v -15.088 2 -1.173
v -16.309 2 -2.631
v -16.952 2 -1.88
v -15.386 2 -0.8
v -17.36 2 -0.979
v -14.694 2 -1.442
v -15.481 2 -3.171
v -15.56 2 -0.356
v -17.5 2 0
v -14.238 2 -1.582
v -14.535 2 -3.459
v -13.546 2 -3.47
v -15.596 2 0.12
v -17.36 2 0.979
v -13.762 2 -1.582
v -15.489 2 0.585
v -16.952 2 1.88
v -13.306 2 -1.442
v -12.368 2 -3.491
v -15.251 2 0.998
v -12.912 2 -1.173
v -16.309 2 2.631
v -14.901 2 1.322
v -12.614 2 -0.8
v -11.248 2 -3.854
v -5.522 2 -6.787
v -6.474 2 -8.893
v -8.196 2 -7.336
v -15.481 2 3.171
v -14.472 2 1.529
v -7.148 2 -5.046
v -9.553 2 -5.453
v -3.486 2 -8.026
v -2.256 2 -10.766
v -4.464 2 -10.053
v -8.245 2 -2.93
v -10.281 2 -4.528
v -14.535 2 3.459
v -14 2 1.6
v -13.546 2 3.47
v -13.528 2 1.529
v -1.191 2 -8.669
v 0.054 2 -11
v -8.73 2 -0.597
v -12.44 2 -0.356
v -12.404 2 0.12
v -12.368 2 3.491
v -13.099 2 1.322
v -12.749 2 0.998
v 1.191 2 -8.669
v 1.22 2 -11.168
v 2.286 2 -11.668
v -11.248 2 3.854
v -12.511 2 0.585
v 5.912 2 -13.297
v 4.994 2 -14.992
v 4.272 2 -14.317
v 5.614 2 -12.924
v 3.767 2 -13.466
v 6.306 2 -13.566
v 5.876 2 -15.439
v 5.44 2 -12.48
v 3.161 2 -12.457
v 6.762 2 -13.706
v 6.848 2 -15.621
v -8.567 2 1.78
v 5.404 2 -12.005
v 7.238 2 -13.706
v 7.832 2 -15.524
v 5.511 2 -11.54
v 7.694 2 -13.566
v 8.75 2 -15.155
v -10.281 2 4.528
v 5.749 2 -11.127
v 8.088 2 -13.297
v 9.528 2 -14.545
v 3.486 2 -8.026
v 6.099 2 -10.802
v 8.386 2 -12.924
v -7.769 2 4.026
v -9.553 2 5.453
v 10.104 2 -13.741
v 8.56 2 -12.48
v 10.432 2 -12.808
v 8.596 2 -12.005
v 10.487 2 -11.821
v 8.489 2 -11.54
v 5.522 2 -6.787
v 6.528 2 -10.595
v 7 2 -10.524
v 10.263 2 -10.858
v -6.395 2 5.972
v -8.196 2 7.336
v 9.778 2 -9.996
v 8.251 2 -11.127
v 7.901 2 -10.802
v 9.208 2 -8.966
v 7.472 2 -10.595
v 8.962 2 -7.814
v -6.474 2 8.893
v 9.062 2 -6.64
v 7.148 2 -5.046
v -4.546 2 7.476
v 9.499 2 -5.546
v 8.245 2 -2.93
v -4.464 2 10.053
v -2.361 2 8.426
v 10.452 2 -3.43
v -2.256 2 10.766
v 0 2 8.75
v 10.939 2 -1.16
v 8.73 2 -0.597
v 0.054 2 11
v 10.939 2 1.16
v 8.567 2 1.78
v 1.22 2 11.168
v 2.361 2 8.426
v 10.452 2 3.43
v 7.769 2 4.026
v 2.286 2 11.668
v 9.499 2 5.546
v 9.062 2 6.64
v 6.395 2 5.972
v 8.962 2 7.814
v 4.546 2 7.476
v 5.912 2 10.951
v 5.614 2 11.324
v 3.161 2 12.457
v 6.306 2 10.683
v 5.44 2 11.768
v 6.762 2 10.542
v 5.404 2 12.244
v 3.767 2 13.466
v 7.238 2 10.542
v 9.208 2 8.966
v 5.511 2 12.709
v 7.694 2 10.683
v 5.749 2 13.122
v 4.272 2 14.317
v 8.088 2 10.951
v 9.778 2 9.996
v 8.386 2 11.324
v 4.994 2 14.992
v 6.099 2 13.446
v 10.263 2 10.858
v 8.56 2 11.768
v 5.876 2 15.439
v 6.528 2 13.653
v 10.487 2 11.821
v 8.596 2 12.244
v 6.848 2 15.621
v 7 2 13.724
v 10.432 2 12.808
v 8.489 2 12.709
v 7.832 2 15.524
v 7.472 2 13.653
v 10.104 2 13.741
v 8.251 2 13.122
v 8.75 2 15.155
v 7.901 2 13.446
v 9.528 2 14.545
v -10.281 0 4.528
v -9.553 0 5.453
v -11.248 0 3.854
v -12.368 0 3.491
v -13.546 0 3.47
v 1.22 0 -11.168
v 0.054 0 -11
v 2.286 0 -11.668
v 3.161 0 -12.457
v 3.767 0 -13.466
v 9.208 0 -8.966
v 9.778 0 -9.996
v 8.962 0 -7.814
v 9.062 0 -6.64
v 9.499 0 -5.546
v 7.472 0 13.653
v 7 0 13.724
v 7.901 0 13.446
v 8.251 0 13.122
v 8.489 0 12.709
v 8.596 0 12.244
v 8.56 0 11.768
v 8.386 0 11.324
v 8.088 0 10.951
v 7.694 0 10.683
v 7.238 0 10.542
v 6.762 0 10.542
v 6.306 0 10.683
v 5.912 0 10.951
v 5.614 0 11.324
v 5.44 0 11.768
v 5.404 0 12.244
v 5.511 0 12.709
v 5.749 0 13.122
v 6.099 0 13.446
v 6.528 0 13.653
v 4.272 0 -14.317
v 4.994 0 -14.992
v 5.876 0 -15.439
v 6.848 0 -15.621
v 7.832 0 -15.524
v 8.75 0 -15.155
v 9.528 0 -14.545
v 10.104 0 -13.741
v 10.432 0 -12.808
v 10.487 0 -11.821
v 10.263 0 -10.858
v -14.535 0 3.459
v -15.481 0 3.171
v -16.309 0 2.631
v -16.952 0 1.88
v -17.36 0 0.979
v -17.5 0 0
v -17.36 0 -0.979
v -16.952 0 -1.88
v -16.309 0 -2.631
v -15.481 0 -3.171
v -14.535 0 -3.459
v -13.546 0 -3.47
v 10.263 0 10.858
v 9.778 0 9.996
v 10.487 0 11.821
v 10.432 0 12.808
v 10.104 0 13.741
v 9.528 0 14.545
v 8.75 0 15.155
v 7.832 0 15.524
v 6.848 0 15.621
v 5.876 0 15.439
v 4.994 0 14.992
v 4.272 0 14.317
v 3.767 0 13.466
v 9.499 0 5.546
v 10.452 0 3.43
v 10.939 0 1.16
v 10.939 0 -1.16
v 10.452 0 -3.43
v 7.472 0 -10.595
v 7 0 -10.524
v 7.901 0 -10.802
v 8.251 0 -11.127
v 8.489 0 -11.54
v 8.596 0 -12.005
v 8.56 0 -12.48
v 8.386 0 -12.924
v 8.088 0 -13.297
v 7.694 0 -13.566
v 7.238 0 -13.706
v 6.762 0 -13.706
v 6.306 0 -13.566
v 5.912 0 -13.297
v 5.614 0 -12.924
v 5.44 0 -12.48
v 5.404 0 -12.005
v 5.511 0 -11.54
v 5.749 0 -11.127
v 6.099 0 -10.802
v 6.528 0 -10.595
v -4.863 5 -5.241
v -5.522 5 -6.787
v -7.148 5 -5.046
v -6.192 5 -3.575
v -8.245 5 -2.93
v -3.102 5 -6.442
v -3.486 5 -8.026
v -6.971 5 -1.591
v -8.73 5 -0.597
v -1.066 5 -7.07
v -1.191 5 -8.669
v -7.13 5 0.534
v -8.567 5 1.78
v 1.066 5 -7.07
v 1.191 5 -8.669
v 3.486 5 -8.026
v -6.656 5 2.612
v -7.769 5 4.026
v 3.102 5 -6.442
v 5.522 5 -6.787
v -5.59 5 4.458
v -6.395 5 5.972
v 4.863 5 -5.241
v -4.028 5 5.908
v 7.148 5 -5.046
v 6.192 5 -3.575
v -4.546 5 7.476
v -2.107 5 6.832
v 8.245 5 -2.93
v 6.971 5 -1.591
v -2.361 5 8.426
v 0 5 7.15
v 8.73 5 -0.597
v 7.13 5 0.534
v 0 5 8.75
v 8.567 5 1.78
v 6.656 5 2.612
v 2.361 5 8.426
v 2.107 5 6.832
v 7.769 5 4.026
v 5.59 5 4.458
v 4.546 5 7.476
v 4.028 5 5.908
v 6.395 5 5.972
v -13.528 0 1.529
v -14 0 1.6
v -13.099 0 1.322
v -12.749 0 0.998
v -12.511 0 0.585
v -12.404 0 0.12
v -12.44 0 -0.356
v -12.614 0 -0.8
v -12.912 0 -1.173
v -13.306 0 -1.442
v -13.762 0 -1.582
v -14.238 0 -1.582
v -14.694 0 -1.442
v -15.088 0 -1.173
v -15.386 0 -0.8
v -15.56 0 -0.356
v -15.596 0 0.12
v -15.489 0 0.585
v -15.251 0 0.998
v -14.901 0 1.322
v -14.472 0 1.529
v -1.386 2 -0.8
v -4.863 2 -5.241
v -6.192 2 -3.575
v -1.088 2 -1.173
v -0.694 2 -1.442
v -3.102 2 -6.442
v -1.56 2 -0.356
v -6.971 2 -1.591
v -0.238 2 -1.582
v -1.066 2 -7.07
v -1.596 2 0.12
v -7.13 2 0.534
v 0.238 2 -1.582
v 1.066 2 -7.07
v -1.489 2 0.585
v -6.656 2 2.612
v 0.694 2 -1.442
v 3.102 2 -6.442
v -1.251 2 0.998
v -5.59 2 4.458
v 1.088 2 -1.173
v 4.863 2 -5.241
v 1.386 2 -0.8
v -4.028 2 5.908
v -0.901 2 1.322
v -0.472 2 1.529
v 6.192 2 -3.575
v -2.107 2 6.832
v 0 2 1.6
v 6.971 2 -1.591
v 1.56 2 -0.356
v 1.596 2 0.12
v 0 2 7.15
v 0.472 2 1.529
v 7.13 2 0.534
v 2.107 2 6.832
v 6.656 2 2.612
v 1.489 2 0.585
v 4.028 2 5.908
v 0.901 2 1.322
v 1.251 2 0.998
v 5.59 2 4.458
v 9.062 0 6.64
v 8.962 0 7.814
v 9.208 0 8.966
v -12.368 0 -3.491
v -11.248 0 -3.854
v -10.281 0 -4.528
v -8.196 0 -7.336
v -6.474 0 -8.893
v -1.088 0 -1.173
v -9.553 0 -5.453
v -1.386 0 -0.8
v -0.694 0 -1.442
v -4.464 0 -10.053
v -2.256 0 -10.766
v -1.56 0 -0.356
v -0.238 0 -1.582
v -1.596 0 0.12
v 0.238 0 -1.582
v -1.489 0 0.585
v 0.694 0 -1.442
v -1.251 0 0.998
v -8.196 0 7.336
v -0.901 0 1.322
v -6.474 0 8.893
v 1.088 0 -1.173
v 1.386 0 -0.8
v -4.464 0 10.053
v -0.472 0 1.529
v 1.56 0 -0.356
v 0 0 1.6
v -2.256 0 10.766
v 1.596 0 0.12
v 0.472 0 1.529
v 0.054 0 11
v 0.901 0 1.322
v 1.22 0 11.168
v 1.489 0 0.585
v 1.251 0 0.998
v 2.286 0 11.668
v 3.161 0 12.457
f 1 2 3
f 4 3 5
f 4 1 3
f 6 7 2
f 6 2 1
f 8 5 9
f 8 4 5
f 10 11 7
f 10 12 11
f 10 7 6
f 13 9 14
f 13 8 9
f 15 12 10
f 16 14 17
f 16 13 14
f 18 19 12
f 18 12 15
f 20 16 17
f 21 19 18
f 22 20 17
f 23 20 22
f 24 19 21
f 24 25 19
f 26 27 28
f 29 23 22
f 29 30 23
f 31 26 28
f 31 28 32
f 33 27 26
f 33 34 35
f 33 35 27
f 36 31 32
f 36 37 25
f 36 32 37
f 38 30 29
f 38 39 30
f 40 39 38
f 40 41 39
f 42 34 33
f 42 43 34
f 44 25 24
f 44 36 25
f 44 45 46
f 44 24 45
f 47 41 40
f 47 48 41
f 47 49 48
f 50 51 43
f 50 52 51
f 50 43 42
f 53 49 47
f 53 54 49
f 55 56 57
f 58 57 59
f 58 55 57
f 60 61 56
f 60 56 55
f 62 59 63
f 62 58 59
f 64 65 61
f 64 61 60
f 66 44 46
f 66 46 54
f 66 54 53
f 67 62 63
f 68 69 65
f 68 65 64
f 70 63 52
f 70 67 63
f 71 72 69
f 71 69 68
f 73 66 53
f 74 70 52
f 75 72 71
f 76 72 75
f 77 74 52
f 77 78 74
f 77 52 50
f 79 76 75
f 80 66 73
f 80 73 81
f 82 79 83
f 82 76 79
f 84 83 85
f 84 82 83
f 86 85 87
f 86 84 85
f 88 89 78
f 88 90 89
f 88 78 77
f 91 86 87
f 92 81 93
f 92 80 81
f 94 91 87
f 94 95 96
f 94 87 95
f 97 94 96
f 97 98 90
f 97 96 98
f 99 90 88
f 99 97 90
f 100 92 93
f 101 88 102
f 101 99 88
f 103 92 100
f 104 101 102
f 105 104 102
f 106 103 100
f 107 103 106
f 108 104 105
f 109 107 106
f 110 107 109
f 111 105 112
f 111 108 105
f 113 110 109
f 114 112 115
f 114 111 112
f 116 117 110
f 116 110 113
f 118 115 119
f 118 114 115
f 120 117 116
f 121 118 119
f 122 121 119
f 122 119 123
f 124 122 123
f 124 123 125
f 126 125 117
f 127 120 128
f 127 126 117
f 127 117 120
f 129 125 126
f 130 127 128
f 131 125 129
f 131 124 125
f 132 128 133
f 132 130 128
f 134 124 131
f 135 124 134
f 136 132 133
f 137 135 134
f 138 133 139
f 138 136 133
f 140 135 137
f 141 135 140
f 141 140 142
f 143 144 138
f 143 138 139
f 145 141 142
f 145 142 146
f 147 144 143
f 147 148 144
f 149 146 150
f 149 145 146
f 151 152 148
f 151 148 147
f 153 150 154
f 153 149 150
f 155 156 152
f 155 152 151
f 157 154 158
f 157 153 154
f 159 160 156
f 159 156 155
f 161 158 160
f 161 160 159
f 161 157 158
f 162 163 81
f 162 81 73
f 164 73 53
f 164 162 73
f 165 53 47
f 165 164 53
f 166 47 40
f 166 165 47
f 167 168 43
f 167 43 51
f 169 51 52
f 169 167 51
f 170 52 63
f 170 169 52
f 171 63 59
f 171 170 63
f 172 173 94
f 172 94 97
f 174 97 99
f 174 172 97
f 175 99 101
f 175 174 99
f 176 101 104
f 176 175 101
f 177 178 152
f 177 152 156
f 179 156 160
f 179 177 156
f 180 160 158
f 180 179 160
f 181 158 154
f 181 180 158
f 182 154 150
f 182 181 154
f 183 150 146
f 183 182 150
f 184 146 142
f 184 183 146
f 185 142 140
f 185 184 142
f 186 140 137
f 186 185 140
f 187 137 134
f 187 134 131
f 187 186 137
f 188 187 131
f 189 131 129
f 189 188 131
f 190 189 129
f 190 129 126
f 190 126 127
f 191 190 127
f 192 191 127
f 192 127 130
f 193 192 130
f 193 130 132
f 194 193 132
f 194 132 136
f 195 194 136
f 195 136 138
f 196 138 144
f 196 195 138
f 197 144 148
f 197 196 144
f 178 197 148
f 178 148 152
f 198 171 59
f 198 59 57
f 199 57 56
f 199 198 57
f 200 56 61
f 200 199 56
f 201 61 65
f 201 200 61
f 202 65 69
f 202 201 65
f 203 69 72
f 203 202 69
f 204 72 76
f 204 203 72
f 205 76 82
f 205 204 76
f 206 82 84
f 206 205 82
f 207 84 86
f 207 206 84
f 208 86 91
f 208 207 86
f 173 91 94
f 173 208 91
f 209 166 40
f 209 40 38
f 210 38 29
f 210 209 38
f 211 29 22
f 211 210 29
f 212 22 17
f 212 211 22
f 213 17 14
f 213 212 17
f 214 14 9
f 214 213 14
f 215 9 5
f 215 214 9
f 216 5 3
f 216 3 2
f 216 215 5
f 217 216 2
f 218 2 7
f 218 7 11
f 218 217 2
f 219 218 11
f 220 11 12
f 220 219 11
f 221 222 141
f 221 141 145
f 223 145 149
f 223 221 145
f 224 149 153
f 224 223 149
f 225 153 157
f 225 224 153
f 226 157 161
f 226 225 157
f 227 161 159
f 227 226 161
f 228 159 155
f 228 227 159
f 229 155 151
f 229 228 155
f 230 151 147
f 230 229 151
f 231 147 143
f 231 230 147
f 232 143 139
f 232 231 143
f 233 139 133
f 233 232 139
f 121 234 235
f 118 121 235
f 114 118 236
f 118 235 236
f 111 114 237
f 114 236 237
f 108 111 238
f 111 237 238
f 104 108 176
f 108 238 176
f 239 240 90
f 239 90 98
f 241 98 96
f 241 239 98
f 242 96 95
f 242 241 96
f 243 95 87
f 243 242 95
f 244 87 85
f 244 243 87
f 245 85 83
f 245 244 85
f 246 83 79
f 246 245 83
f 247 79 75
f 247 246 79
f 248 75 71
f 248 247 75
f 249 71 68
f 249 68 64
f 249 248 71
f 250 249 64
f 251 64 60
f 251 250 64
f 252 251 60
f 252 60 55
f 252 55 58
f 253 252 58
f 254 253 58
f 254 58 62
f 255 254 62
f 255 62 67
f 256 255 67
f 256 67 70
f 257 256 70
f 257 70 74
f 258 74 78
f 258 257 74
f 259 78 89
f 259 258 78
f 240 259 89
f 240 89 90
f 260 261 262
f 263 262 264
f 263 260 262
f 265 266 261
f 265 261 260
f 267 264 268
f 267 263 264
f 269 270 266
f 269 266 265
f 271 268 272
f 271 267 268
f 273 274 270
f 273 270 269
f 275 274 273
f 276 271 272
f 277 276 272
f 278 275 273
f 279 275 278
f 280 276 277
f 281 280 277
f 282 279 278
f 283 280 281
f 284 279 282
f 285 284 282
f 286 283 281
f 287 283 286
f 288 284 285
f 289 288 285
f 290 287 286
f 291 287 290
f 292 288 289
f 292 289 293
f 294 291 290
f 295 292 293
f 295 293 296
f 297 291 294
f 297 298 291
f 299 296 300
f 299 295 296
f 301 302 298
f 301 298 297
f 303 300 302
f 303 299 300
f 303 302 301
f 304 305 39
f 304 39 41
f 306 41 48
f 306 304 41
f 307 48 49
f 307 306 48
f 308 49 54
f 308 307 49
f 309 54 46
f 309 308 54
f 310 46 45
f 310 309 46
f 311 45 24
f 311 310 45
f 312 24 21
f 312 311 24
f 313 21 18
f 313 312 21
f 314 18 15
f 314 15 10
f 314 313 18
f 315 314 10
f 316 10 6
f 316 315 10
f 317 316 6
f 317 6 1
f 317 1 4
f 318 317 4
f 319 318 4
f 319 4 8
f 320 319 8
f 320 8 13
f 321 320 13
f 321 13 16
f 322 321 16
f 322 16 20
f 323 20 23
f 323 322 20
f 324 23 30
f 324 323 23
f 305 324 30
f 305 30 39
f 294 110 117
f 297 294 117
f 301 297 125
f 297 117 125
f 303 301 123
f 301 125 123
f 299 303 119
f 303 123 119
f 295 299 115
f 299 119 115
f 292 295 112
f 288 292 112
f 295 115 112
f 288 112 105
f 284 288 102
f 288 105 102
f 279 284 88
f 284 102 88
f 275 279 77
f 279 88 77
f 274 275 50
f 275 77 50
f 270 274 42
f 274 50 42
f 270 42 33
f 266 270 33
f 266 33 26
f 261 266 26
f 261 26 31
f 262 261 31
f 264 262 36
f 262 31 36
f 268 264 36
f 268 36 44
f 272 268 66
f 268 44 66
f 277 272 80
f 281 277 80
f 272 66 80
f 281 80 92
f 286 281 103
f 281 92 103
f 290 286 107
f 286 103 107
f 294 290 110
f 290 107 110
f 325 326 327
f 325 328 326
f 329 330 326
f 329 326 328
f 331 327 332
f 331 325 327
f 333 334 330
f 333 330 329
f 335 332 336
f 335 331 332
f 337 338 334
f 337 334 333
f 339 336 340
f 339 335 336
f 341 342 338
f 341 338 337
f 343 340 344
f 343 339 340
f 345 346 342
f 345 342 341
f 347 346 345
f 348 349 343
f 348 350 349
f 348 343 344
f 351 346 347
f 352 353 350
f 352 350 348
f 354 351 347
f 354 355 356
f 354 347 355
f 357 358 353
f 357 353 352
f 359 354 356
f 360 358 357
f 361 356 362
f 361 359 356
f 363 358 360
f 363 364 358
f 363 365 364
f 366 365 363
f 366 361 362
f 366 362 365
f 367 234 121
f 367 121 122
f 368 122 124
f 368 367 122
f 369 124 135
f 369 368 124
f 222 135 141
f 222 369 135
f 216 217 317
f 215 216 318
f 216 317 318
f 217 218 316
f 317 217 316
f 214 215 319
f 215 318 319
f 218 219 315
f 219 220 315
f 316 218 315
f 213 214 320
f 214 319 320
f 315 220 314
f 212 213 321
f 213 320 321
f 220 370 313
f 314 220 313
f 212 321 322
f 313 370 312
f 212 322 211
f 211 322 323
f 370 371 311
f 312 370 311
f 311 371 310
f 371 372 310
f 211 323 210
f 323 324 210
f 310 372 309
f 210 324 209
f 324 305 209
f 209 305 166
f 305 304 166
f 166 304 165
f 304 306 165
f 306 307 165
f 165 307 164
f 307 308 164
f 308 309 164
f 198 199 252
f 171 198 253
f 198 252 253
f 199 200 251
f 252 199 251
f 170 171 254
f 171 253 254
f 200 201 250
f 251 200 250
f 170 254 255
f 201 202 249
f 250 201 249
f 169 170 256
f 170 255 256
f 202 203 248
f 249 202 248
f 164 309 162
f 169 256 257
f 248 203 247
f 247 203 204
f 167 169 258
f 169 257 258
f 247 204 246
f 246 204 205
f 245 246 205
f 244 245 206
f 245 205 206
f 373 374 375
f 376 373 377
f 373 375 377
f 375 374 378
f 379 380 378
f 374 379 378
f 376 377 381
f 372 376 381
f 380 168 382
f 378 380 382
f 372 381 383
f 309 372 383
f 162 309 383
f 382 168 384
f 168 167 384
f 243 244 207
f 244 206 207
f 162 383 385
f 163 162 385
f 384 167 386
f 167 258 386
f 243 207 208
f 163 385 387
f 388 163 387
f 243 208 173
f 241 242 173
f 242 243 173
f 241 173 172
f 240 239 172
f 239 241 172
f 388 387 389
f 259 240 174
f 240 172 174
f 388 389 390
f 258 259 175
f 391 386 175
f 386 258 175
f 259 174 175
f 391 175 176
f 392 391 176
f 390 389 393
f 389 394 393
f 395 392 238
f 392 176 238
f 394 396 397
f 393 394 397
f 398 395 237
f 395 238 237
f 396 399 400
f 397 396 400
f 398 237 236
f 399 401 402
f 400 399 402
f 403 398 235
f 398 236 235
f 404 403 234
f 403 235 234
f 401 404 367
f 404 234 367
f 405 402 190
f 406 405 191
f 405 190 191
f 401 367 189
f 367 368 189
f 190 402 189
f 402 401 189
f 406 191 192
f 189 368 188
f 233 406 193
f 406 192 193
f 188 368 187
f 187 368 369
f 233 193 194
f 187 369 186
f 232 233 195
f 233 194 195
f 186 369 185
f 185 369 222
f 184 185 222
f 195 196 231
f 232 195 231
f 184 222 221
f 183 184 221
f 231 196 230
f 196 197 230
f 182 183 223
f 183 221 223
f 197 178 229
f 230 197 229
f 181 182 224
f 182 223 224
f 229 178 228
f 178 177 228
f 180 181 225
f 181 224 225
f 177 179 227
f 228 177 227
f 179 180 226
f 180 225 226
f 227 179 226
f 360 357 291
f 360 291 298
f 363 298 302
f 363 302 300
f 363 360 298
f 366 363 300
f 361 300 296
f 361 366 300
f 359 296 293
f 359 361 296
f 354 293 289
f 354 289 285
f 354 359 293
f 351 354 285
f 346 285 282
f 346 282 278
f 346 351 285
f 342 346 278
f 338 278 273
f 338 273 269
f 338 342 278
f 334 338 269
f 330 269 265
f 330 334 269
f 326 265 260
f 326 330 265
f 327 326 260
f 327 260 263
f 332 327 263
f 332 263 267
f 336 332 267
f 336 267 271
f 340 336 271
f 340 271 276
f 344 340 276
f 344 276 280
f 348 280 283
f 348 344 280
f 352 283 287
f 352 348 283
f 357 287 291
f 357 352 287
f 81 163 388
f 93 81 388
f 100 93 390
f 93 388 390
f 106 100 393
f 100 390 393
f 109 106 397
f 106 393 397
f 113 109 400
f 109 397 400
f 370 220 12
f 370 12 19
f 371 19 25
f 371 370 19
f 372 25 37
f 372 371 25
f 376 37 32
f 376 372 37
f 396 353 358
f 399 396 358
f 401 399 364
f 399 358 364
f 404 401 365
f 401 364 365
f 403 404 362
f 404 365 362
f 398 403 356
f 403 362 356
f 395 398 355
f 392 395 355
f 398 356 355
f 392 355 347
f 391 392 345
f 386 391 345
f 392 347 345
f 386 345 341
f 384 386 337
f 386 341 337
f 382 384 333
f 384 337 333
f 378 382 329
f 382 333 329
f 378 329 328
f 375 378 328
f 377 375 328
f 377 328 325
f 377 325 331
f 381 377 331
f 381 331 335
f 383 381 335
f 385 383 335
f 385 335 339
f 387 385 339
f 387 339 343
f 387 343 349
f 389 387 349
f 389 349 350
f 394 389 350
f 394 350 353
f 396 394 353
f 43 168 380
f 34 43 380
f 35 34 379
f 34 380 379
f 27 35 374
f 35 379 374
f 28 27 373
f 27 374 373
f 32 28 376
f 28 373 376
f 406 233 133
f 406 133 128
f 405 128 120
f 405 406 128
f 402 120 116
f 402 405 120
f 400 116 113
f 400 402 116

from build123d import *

# Parameters (mm, degrees)
SKETCH_1_R          = 11
EXTRUDE_1_DEPTH     = 2
EXTRUDE_START       = -2
SKETCH_2_R          = 1.6
EXTRUDE_2_DEPTH     = 2
CUT_EXTRUDE_1_REACH = 25.545
SKETCH_3_R          = 1.6
SKETCH_4_R          = 8.75
SKETCH_4_R_2        = 7.15
EXTRUDE_3_DEPTH     = 3


with BuildPart() as part:
    # 草图1 → 凸台-拉伸1 (new body)
    with BuildSketch(Plane(origin=(0, 0, 0), x_dir=(1, 0, 0), z_dir=(0, 1, 0))):
        with Locations(Location((0, 0, 0), (0, 0, 270))):
            Circle(SKETCH_1_R)
    extrude(amount=EXTRUDE_1_DEPTH)

    # 草图2 → 凸台-拉伸2 (add)
    # profile 1 of 3: a face of its own
    with BuildSketch(Plane(origin=(0, 2, 0), x_dir=(1, 0, 0), z_dir=(0, 1, 0)).offset(EXTRUDE_START)):
        with BuildLine():
            ThreePointArc((0.053619854, -10.999869313), (5.5, -9.526279442), (9.499356337, -5.546370812))
            ThreePointArc((9.499356337, -5.546370812), (8.961509488, -7.8135778), (9.778378275, -9.995831713))
            ThreePointArc((9.778378275, -9.995831713), (8.75, -15.155444566), (3.767455058, -13.466239851))
            ThreePointArc((3.767455058, -13.466239851), (2.286002125, -11.667683773), (0.053619854, -10.999869313))
        make_face()
        with Locations(Location((7, -12.124355653, 0), (0, 0, 270))):
            Circle(SKETCH_2_R, mode=Mode.SUBTRACT)
    # profile 2 of 3: a face of its own
    with BuildSketch(Plane(origin=(0, 2, 0), x_dir=(1, 0, 0), z_dir=(0, 1, 0)).offset(EXTRUDE_START)):
        with BuildLine():
            ThreePointArc((9.499356337, 5.546370812), (5.5, 9.526279442), (0.053619854, 10.999869313))
            ThreePointArc((0.053619854, 10.999869313), (2.286002125, 11.667683773), (3.767455058, 13.466239851))
            ThreePointArc((3.767455058, 13.466239851), (8.75, 15.155444566), (9.778378275, 9.995831713))
            ThreePointArc((9.778378275, 9.995831713), (8.961509488, 7.8135778), (9.499356337, 5.546370812))
        make_face()
        with Locations(Location((7, 12.124355653, 0), (0, 0, 270))):
            Circle(SKETCH_2_R, mode=Mode.SUBTRACT)
    # profile 3 of 3: a face of its own
    with BuildSketch(Plane(origin=(0, 2, 0), x_dir=(1, 0, 0), z_dir=(0, 1, 0)).offset(EXTRUDE_START)):
        with BuildLine():
            ThreePointArc((-9.55297619, -5.453498501), (-11.247511613, -3.854105973), (-13.545833333, -3.470408137))
            ThreePointArc((-13.545833333, -3.470408137), (-17.5, 0), (-13.545833333, 3.470408137))
            ThreePointArc((-13.545833333, 3.470408137), (-11.247511613, 3.854105973), (-9.55297619, 5.453498501))
            ThreePointArc((-9.55297619, 5.453498501), (-11, 0), (-9.55297619, -5.453498501))
        make_face()
        with Locations(Location((-14, 0, 0), (0, 0, 270))):
            Circle(SKETCH_2_R, mode=Mode.SUBTRACT)
    extrude(amount=EXTRUDE_2_DEPTH)

    # 草图3 → 切除-拉伸1 (cut, up to next)
    with BuildSketch(Plane(origin=(0, 2, 0), x_dir=(1, 0, 0), z_dir=(0, 1, 0)), mode=Mode.PRIVATE) as cut_extrude_1_sk1:
        with Locations(Location((0, 0, 0), (0, 0, 270))):
            Circle(SKETCH_3_R)
    cut_extrude_1_tool1 = extrude(cut_extrude_1_sk1.sketch, amount=-CUT_EXTRUDE_1_REACH, mode=Mode.PRIVATE) & part.part
    add(cut_extrude_1_tool1.solids().sort_by_distance((0, 2, 0))[0], mode=Mode.SUBTRACT)

    # 草图4 → 凸台-拉伸3 (add)
    with BuildSketch(Plane(origin=(0, 2, 0), x_dir=(1, 0, 0), z_dir=(0, 1, 0))):
        with Locations(Location((0, 0, 0), (0, 0, 270))):
            Circle(SKETCH_4_R)
        with Locations(Location((0, 0, 0), (0, 0, 270))):
            Circle(SKETCH_4_R_2, mode=Mode.SUBTRACT)
    extrude(amount=EXTRUDE_3_DEPTH)


solid = part.part
